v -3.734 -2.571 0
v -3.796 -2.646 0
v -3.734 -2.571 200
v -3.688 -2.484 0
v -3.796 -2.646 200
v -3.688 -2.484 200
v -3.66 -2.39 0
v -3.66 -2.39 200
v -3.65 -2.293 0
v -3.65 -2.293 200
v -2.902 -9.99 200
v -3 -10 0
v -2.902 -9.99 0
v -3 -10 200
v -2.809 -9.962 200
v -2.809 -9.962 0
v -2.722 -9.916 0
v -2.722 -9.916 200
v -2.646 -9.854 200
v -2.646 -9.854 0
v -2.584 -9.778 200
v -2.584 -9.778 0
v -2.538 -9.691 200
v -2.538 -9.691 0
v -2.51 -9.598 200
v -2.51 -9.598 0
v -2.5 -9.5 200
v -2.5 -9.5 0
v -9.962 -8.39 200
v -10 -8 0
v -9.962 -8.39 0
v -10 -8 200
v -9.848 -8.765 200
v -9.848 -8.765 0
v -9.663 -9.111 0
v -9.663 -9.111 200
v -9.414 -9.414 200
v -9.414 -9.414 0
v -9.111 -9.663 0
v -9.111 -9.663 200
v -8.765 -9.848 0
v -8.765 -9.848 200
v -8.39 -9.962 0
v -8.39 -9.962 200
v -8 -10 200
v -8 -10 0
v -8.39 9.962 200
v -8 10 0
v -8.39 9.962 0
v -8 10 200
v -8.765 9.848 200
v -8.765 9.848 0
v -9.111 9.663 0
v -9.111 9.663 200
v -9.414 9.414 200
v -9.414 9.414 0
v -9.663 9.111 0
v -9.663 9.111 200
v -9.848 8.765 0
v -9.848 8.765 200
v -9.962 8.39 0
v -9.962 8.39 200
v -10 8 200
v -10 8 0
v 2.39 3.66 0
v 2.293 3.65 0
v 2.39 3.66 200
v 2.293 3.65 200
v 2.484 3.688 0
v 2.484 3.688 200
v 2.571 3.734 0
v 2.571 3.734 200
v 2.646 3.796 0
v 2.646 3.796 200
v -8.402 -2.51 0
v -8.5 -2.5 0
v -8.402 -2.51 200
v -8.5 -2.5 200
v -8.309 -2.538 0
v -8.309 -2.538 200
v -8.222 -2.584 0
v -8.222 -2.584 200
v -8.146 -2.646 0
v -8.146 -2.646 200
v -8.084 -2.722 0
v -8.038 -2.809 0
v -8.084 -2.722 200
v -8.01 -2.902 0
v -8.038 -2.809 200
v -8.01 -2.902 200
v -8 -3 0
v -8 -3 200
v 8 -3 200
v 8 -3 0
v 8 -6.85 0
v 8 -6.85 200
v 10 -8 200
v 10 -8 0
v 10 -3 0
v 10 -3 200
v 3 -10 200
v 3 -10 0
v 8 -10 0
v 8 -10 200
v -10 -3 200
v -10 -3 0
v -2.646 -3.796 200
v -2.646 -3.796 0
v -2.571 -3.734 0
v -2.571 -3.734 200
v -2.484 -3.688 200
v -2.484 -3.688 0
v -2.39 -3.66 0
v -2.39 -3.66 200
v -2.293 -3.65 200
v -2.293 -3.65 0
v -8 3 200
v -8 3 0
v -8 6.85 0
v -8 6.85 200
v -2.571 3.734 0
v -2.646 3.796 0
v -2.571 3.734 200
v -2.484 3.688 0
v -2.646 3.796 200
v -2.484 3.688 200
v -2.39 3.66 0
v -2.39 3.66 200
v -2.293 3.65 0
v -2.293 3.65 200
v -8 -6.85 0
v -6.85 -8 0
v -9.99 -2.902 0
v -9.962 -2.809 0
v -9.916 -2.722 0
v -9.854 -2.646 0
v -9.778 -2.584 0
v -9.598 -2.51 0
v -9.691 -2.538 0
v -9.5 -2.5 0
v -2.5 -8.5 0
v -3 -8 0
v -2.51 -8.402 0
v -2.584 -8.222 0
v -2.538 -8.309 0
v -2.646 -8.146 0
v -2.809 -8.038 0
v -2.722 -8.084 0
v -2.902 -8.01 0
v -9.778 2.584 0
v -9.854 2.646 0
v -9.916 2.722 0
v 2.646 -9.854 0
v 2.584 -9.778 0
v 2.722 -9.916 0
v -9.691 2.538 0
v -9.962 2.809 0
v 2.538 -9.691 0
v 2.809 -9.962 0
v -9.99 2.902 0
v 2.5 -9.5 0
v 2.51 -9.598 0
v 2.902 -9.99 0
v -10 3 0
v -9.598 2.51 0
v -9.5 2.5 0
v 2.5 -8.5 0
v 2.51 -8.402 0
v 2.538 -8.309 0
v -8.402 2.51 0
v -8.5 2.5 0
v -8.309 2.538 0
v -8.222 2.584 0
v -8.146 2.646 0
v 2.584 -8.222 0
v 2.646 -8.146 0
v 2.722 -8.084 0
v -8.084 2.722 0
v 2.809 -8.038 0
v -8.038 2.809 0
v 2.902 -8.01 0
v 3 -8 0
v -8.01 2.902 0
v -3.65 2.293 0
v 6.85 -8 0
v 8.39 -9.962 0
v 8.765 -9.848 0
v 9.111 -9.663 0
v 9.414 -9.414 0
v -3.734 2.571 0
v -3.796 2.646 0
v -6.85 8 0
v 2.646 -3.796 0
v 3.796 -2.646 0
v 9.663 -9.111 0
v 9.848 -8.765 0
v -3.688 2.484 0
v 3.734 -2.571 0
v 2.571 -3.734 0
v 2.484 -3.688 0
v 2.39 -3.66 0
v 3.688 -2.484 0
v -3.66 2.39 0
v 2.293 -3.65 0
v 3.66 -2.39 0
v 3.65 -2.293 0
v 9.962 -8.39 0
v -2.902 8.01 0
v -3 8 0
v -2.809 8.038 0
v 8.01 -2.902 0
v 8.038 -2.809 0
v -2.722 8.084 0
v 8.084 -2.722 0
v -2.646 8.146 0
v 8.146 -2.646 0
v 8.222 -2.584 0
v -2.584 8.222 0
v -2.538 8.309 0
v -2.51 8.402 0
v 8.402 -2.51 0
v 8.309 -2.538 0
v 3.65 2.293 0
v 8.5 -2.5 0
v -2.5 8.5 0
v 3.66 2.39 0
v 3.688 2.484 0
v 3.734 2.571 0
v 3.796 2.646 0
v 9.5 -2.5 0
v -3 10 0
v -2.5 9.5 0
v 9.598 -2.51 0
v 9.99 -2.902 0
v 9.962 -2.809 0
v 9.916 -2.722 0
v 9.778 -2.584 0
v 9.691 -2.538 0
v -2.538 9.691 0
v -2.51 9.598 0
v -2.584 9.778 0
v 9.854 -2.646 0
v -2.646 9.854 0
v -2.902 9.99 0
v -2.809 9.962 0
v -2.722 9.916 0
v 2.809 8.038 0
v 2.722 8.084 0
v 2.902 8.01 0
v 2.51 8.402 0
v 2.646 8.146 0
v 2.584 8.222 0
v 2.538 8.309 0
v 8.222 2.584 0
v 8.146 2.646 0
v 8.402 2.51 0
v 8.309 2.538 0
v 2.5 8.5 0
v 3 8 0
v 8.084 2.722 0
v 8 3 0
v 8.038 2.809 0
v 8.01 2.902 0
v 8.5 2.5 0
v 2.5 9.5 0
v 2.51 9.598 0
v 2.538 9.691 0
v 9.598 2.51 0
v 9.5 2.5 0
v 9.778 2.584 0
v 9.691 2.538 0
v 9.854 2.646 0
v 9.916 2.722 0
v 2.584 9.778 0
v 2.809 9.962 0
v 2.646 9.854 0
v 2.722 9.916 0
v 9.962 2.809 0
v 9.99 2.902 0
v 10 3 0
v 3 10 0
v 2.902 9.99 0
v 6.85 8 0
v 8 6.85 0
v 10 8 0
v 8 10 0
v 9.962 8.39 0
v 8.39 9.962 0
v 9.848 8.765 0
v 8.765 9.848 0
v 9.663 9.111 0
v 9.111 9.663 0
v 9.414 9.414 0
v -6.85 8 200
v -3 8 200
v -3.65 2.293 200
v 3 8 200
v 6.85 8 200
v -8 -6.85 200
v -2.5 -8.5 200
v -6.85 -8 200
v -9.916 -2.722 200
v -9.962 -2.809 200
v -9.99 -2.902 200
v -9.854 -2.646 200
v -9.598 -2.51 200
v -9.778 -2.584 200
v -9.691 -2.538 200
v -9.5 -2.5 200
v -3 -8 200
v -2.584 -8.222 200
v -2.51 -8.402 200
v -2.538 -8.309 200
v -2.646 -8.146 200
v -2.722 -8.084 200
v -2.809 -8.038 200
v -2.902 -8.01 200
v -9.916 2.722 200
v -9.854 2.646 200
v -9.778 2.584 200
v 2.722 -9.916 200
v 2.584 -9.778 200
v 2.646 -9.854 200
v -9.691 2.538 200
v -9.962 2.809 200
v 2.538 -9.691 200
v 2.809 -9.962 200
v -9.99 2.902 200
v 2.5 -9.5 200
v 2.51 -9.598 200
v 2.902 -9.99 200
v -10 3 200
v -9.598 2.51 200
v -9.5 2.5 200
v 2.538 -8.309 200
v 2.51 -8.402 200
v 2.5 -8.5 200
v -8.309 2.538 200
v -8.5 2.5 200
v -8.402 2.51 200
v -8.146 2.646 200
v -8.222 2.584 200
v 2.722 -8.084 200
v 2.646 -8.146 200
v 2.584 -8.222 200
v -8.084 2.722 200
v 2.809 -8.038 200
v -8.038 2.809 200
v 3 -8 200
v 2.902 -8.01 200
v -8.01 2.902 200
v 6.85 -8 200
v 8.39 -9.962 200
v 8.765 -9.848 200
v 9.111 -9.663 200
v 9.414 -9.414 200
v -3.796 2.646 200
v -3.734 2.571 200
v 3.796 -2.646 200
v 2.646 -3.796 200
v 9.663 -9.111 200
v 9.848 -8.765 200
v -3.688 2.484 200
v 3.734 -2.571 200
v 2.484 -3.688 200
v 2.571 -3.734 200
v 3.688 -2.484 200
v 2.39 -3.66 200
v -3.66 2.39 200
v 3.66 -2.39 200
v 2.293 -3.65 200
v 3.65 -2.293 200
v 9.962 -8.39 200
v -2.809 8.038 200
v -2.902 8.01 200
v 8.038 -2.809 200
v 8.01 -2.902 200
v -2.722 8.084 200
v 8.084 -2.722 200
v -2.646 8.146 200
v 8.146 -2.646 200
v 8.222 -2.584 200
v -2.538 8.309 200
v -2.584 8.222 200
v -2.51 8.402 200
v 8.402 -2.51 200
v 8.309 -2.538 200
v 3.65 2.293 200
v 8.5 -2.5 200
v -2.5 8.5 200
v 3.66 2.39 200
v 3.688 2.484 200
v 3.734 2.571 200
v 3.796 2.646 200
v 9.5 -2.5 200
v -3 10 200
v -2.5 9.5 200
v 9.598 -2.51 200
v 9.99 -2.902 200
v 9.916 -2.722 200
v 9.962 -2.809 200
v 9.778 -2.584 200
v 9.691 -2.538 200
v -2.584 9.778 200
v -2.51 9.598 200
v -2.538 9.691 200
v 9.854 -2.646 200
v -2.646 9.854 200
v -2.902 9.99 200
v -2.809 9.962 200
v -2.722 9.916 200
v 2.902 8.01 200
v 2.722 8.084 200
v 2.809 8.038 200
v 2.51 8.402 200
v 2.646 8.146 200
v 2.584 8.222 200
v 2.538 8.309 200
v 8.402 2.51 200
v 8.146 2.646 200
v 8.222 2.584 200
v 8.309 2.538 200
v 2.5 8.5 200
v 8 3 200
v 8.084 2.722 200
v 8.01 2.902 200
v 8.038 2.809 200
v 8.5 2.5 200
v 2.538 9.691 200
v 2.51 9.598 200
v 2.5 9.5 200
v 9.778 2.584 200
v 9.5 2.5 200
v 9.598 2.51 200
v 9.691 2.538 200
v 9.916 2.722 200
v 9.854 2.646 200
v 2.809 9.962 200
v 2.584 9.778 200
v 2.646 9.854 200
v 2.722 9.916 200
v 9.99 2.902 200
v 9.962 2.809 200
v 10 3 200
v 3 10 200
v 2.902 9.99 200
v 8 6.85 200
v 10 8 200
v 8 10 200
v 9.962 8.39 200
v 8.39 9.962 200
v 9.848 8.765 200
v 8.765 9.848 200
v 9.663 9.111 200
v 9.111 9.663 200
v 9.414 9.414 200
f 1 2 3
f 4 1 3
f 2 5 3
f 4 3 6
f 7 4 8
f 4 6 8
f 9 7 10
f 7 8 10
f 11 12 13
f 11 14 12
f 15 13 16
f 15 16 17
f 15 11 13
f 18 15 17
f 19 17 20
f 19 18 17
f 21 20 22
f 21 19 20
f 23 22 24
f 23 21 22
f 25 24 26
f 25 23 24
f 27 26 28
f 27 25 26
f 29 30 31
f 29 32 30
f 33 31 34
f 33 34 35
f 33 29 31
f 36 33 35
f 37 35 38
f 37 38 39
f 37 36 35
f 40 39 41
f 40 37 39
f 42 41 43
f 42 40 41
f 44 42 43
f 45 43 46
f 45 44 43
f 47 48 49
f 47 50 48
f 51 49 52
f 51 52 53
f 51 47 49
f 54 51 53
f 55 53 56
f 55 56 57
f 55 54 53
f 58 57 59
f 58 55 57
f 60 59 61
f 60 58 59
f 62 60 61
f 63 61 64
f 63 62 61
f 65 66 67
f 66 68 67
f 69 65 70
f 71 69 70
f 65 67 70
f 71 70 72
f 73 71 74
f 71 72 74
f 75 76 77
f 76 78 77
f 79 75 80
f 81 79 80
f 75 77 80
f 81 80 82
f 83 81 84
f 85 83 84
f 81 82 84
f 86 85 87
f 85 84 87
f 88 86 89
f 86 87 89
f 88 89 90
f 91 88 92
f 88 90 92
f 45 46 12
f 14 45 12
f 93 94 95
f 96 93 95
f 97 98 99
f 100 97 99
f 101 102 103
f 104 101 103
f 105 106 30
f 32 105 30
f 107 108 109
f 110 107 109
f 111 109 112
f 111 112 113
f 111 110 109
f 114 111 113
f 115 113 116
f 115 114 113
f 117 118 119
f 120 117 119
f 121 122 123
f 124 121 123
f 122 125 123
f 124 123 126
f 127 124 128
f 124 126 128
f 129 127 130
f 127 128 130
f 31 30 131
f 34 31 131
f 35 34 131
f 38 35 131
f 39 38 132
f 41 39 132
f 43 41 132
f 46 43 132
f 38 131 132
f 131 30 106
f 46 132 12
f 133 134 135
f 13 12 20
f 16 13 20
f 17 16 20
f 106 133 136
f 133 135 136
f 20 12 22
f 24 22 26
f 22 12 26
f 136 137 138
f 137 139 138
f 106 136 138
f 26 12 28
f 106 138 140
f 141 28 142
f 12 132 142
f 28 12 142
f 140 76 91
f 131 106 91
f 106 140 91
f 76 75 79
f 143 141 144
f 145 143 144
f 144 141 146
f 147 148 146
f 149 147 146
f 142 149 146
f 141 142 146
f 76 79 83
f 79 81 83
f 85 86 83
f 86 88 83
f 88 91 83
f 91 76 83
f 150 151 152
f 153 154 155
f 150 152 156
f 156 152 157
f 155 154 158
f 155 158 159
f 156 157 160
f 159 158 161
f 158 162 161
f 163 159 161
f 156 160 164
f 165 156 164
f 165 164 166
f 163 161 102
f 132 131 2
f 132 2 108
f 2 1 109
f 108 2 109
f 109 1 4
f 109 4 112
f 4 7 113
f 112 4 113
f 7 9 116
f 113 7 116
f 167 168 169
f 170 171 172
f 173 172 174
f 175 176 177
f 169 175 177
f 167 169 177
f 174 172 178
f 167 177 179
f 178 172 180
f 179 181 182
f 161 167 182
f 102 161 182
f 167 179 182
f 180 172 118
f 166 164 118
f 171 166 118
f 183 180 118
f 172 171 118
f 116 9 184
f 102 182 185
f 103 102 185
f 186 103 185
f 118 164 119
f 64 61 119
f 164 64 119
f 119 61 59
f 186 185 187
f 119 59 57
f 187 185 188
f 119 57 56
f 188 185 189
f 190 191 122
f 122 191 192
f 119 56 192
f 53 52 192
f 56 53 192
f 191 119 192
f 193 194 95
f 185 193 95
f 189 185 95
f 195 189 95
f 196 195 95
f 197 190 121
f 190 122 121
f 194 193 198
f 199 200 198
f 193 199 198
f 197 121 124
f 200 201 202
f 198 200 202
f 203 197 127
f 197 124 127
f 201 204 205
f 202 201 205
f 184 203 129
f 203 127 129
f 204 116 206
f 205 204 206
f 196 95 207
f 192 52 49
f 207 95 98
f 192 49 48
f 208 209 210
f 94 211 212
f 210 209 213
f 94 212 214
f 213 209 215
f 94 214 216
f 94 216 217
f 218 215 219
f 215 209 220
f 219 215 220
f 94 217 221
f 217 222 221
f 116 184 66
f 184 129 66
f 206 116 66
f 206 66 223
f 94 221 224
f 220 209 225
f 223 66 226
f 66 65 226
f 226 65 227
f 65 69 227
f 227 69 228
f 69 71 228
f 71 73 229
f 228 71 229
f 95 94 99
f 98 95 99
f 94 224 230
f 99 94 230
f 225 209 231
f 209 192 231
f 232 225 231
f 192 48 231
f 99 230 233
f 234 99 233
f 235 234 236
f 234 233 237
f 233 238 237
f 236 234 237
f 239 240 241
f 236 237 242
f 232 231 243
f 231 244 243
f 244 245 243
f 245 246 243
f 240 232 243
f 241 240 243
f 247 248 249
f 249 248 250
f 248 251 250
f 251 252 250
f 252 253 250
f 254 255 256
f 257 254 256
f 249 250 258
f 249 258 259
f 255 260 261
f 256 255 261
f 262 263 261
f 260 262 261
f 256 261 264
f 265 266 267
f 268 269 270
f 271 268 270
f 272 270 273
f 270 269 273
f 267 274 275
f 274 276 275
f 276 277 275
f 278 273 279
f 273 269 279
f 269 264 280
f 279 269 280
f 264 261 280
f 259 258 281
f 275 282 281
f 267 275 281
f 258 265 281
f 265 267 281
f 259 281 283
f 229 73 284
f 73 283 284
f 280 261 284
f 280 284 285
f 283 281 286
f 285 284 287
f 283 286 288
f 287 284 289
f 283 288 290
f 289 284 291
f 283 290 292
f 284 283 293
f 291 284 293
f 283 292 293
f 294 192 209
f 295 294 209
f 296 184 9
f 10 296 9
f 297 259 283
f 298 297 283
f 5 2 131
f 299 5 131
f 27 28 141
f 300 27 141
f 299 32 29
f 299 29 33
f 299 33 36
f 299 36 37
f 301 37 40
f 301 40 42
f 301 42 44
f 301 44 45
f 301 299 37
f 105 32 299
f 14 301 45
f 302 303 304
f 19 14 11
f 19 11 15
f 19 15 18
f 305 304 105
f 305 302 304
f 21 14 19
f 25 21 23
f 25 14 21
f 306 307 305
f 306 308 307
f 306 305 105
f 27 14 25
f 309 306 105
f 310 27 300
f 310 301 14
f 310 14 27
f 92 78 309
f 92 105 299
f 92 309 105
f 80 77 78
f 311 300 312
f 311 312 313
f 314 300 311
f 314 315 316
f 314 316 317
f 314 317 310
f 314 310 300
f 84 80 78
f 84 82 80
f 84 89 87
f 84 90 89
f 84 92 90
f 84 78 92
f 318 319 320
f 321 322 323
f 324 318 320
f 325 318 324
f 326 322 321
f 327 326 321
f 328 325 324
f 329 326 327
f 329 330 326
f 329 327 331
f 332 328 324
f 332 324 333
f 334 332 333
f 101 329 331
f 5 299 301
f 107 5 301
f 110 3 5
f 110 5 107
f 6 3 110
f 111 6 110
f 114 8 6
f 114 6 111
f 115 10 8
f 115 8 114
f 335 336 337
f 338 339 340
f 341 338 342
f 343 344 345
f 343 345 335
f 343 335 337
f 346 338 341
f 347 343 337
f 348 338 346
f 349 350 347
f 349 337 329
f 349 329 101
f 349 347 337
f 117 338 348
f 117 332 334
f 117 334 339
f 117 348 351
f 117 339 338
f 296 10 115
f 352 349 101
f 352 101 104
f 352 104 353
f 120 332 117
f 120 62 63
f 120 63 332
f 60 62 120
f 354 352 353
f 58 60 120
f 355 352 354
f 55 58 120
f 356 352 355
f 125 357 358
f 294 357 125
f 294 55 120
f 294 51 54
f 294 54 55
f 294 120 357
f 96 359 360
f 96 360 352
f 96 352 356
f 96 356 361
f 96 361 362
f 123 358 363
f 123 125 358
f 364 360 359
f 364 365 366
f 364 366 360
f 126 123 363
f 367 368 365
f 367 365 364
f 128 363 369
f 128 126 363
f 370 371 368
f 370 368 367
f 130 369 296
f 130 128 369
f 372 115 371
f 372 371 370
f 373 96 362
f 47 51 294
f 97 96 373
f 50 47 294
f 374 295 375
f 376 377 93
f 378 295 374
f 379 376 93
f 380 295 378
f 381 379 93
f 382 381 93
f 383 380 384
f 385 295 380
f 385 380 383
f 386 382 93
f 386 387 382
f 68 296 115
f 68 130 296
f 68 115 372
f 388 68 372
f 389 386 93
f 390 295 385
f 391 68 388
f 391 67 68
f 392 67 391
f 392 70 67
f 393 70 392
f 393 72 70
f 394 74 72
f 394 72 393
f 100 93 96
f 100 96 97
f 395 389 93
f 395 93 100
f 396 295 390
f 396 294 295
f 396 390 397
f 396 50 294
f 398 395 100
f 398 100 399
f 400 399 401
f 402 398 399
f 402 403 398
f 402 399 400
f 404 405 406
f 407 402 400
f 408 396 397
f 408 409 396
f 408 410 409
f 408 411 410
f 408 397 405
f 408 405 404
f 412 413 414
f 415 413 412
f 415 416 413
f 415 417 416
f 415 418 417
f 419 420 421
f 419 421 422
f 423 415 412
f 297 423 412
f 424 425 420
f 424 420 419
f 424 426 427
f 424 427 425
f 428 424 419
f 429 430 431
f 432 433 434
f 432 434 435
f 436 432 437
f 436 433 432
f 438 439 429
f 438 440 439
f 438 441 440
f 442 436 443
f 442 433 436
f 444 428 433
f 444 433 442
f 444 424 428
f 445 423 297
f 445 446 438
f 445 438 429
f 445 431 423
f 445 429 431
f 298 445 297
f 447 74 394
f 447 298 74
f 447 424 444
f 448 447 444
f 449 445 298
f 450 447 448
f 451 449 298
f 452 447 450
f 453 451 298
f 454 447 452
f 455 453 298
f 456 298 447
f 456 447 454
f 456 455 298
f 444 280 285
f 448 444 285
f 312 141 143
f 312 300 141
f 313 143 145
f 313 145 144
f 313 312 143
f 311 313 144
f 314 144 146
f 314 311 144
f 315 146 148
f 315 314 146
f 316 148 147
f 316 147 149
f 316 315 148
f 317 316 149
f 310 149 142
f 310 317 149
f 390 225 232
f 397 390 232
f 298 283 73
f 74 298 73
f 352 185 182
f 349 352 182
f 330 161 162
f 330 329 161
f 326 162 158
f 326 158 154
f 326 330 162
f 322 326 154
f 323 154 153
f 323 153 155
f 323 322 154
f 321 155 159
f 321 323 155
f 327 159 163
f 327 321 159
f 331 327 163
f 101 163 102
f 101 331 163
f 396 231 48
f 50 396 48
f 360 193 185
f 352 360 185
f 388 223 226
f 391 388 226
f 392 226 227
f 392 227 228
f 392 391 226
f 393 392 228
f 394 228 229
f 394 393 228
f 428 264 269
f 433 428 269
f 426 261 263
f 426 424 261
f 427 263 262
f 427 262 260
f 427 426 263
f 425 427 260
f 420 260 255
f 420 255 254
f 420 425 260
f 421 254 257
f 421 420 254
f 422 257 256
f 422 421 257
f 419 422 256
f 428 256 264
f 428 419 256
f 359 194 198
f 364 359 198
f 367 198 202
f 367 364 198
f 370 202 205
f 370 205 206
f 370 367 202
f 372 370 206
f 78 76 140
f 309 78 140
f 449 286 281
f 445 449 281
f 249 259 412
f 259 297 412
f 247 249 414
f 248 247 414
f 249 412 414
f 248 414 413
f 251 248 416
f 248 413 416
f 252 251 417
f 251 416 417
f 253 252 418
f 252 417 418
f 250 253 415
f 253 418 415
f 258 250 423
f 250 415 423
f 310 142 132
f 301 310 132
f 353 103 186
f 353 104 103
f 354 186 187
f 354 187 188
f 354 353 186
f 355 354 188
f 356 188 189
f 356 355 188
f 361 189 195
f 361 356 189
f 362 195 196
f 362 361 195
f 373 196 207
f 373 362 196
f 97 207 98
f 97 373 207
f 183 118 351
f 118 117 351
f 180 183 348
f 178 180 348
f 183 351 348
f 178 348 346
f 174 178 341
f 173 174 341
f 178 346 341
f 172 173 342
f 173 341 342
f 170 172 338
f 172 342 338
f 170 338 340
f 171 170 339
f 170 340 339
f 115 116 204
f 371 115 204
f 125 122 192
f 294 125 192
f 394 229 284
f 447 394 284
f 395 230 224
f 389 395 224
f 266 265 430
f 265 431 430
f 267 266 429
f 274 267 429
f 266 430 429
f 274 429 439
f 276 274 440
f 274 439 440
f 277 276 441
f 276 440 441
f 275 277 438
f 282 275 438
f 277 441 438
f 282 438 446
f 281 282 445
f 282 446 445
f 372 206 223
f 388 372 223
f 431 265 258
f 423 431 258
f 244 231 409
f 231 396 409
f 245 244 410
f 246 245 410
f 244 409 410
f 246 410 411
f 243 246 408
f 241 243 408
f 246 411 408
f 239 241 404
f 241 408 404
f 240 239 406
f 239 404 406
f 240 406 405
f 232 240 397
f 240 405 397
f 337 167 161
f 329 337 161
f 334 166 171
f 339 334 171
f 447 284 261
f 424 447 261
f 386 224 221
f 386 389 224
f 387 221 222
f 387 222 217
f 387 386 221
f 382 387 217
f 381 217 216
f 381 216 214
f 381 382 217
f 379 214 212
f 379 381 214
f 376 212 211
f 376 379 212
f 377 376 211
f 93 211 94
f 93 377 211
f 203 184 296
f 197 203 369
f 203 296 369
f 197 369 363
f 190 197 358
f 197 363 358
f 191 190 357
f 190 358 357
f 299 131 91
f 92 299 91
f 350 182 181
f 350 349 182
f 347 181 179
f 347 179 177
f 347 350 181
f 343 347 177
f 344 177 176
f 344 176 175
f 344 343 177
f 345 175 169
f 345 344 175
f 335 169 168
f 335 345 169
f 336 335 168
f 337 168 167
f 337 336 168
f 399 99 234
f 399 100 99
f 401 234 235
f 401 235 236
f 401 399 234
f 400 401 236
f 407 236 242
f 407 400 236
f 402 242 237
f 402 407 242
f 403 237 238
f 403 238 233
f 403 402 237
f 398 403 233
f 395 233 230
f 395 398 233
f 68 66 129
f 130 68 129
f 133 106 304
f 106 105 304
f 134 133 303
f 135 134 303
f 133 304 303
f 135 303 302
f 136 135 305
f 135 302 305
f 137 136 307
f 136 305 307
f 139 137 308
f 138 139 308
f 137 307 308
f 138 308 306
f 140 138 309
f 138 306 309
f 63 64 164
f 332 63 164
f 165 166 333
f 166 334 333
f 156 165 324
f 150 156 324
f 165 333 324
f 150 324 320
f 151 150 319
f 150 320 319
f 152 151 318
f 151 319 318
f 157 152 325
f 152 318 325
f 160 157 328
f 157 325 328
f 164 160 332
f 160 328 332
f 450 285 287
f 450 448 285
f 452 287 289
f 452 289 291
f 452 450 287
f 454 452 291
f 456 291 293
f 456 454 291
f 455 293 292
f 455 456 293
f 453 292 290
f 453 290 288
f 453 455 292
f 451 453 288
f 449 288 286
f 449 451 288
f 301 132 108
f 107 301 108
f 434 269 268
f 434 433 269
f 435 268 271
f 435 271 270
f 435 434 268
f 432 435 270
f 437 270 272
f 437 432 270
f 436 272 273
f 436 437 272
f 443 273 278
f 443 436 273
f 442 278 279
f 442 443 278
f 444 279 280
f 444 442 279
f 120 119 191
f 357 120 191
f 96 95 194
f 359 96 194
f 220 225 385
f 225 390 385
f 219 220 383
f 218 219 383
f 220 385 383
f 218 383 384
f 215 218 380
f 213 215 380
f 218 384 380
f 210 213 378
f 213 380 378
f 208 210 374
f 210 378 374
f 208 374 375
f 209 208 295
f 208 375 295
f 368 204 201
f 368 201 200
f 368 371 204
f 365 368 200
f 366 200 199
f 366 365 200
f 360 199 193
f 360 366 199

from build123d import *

# Parameters (mm, degrees)
AUFSATZ_LINEAR_AUSTRAGEN1_DEPTH = 200
VERRUNDUNG1_R                   = 2
VERRUNDUNG2_R                   = 0.5


with BuildPart() as part:
    # Skizze1 → Aufsatz-Linear austragen1 (new body)
    with BuildSketch(Plane.XY):
        Polygon((-10, 2.5), (-8, 2.5), (-8, 6.85), (-3.65, 2.5), (-3.65, -2.5), (-8, -6.85), (-8, -2.5), (-10, -2.5), (-10, -10), (-2.5, -10), (-2.5, -8), (-6.85, -8), (-2.5, -3.65), (2.5, -3.65), (6.85, -8), (2.5, -8), (2.5, -10), (10, -10), (10, -2.5), (8, -2.5), (8, -6.85), (3.65, -2.5), (3.65, 2.5), (8, 6.85), (8, 2.5), (10, 2.5), (10, 10), (2.5, 10), (2.5, 8), (6.85, 8), (2.5, 3.65), (-2.5, 3.65), (-6.85, 8), (-2.5, 8), (-2.5, 10), (-10, 10), align=None)
    extrude(amount=AUFSATZ_LINEAR_AUSTRAGEN1_DEPTH)

    # Verrundung1
    verrundung1_edges = [part.edges().sort_by_distance(p)[0] for p in [
        (-10, 10, 100),
        (-10, -10, 100),
        (10, -10, 100),
        (10, 10, 100),
    ]]
    fillet(verrundung1_edges, radius=VERRUNDUNG1_R)

    # Verrundung2
    verrundung2_edges = [part.edges().sort_by_distance(p)[0] for p in [
        (-2.5, 10, 100),
        (-10, 2.5, 100),
        (-8, 2.5, 100),
        (-3.65, 2.5, 100),
        (-3.65, -2.5, 100),
        (-8, -2.5, 100),
        (-10, -2.5, 100),
        (-2.5, -10, 100),
        (-2.5, -8, 100),
        (-2.5, -3.65, 100),
        (2.5, -3.65, 100),
        (2.5, -8, 100),
        (2.5, -10, 100),
        (10, -2.5, 100),
        (8, -2.5, 100),
        (3.65, -2.5, 100),
        (3.65, 2.5, 100),
        (8, 2.5, 100),
        (10, 2.5, 100),
        (2.5, 10, 100),
        (2.5, 8, 100),
        (2.5, 3.65, 100),
        (-2.5, 3.65, 100),
        (-2.5, 8, 100),
    ]]
    fillet(verrundung2_edges, radius=VERRUNDUNG2_R)


solid = part.part
